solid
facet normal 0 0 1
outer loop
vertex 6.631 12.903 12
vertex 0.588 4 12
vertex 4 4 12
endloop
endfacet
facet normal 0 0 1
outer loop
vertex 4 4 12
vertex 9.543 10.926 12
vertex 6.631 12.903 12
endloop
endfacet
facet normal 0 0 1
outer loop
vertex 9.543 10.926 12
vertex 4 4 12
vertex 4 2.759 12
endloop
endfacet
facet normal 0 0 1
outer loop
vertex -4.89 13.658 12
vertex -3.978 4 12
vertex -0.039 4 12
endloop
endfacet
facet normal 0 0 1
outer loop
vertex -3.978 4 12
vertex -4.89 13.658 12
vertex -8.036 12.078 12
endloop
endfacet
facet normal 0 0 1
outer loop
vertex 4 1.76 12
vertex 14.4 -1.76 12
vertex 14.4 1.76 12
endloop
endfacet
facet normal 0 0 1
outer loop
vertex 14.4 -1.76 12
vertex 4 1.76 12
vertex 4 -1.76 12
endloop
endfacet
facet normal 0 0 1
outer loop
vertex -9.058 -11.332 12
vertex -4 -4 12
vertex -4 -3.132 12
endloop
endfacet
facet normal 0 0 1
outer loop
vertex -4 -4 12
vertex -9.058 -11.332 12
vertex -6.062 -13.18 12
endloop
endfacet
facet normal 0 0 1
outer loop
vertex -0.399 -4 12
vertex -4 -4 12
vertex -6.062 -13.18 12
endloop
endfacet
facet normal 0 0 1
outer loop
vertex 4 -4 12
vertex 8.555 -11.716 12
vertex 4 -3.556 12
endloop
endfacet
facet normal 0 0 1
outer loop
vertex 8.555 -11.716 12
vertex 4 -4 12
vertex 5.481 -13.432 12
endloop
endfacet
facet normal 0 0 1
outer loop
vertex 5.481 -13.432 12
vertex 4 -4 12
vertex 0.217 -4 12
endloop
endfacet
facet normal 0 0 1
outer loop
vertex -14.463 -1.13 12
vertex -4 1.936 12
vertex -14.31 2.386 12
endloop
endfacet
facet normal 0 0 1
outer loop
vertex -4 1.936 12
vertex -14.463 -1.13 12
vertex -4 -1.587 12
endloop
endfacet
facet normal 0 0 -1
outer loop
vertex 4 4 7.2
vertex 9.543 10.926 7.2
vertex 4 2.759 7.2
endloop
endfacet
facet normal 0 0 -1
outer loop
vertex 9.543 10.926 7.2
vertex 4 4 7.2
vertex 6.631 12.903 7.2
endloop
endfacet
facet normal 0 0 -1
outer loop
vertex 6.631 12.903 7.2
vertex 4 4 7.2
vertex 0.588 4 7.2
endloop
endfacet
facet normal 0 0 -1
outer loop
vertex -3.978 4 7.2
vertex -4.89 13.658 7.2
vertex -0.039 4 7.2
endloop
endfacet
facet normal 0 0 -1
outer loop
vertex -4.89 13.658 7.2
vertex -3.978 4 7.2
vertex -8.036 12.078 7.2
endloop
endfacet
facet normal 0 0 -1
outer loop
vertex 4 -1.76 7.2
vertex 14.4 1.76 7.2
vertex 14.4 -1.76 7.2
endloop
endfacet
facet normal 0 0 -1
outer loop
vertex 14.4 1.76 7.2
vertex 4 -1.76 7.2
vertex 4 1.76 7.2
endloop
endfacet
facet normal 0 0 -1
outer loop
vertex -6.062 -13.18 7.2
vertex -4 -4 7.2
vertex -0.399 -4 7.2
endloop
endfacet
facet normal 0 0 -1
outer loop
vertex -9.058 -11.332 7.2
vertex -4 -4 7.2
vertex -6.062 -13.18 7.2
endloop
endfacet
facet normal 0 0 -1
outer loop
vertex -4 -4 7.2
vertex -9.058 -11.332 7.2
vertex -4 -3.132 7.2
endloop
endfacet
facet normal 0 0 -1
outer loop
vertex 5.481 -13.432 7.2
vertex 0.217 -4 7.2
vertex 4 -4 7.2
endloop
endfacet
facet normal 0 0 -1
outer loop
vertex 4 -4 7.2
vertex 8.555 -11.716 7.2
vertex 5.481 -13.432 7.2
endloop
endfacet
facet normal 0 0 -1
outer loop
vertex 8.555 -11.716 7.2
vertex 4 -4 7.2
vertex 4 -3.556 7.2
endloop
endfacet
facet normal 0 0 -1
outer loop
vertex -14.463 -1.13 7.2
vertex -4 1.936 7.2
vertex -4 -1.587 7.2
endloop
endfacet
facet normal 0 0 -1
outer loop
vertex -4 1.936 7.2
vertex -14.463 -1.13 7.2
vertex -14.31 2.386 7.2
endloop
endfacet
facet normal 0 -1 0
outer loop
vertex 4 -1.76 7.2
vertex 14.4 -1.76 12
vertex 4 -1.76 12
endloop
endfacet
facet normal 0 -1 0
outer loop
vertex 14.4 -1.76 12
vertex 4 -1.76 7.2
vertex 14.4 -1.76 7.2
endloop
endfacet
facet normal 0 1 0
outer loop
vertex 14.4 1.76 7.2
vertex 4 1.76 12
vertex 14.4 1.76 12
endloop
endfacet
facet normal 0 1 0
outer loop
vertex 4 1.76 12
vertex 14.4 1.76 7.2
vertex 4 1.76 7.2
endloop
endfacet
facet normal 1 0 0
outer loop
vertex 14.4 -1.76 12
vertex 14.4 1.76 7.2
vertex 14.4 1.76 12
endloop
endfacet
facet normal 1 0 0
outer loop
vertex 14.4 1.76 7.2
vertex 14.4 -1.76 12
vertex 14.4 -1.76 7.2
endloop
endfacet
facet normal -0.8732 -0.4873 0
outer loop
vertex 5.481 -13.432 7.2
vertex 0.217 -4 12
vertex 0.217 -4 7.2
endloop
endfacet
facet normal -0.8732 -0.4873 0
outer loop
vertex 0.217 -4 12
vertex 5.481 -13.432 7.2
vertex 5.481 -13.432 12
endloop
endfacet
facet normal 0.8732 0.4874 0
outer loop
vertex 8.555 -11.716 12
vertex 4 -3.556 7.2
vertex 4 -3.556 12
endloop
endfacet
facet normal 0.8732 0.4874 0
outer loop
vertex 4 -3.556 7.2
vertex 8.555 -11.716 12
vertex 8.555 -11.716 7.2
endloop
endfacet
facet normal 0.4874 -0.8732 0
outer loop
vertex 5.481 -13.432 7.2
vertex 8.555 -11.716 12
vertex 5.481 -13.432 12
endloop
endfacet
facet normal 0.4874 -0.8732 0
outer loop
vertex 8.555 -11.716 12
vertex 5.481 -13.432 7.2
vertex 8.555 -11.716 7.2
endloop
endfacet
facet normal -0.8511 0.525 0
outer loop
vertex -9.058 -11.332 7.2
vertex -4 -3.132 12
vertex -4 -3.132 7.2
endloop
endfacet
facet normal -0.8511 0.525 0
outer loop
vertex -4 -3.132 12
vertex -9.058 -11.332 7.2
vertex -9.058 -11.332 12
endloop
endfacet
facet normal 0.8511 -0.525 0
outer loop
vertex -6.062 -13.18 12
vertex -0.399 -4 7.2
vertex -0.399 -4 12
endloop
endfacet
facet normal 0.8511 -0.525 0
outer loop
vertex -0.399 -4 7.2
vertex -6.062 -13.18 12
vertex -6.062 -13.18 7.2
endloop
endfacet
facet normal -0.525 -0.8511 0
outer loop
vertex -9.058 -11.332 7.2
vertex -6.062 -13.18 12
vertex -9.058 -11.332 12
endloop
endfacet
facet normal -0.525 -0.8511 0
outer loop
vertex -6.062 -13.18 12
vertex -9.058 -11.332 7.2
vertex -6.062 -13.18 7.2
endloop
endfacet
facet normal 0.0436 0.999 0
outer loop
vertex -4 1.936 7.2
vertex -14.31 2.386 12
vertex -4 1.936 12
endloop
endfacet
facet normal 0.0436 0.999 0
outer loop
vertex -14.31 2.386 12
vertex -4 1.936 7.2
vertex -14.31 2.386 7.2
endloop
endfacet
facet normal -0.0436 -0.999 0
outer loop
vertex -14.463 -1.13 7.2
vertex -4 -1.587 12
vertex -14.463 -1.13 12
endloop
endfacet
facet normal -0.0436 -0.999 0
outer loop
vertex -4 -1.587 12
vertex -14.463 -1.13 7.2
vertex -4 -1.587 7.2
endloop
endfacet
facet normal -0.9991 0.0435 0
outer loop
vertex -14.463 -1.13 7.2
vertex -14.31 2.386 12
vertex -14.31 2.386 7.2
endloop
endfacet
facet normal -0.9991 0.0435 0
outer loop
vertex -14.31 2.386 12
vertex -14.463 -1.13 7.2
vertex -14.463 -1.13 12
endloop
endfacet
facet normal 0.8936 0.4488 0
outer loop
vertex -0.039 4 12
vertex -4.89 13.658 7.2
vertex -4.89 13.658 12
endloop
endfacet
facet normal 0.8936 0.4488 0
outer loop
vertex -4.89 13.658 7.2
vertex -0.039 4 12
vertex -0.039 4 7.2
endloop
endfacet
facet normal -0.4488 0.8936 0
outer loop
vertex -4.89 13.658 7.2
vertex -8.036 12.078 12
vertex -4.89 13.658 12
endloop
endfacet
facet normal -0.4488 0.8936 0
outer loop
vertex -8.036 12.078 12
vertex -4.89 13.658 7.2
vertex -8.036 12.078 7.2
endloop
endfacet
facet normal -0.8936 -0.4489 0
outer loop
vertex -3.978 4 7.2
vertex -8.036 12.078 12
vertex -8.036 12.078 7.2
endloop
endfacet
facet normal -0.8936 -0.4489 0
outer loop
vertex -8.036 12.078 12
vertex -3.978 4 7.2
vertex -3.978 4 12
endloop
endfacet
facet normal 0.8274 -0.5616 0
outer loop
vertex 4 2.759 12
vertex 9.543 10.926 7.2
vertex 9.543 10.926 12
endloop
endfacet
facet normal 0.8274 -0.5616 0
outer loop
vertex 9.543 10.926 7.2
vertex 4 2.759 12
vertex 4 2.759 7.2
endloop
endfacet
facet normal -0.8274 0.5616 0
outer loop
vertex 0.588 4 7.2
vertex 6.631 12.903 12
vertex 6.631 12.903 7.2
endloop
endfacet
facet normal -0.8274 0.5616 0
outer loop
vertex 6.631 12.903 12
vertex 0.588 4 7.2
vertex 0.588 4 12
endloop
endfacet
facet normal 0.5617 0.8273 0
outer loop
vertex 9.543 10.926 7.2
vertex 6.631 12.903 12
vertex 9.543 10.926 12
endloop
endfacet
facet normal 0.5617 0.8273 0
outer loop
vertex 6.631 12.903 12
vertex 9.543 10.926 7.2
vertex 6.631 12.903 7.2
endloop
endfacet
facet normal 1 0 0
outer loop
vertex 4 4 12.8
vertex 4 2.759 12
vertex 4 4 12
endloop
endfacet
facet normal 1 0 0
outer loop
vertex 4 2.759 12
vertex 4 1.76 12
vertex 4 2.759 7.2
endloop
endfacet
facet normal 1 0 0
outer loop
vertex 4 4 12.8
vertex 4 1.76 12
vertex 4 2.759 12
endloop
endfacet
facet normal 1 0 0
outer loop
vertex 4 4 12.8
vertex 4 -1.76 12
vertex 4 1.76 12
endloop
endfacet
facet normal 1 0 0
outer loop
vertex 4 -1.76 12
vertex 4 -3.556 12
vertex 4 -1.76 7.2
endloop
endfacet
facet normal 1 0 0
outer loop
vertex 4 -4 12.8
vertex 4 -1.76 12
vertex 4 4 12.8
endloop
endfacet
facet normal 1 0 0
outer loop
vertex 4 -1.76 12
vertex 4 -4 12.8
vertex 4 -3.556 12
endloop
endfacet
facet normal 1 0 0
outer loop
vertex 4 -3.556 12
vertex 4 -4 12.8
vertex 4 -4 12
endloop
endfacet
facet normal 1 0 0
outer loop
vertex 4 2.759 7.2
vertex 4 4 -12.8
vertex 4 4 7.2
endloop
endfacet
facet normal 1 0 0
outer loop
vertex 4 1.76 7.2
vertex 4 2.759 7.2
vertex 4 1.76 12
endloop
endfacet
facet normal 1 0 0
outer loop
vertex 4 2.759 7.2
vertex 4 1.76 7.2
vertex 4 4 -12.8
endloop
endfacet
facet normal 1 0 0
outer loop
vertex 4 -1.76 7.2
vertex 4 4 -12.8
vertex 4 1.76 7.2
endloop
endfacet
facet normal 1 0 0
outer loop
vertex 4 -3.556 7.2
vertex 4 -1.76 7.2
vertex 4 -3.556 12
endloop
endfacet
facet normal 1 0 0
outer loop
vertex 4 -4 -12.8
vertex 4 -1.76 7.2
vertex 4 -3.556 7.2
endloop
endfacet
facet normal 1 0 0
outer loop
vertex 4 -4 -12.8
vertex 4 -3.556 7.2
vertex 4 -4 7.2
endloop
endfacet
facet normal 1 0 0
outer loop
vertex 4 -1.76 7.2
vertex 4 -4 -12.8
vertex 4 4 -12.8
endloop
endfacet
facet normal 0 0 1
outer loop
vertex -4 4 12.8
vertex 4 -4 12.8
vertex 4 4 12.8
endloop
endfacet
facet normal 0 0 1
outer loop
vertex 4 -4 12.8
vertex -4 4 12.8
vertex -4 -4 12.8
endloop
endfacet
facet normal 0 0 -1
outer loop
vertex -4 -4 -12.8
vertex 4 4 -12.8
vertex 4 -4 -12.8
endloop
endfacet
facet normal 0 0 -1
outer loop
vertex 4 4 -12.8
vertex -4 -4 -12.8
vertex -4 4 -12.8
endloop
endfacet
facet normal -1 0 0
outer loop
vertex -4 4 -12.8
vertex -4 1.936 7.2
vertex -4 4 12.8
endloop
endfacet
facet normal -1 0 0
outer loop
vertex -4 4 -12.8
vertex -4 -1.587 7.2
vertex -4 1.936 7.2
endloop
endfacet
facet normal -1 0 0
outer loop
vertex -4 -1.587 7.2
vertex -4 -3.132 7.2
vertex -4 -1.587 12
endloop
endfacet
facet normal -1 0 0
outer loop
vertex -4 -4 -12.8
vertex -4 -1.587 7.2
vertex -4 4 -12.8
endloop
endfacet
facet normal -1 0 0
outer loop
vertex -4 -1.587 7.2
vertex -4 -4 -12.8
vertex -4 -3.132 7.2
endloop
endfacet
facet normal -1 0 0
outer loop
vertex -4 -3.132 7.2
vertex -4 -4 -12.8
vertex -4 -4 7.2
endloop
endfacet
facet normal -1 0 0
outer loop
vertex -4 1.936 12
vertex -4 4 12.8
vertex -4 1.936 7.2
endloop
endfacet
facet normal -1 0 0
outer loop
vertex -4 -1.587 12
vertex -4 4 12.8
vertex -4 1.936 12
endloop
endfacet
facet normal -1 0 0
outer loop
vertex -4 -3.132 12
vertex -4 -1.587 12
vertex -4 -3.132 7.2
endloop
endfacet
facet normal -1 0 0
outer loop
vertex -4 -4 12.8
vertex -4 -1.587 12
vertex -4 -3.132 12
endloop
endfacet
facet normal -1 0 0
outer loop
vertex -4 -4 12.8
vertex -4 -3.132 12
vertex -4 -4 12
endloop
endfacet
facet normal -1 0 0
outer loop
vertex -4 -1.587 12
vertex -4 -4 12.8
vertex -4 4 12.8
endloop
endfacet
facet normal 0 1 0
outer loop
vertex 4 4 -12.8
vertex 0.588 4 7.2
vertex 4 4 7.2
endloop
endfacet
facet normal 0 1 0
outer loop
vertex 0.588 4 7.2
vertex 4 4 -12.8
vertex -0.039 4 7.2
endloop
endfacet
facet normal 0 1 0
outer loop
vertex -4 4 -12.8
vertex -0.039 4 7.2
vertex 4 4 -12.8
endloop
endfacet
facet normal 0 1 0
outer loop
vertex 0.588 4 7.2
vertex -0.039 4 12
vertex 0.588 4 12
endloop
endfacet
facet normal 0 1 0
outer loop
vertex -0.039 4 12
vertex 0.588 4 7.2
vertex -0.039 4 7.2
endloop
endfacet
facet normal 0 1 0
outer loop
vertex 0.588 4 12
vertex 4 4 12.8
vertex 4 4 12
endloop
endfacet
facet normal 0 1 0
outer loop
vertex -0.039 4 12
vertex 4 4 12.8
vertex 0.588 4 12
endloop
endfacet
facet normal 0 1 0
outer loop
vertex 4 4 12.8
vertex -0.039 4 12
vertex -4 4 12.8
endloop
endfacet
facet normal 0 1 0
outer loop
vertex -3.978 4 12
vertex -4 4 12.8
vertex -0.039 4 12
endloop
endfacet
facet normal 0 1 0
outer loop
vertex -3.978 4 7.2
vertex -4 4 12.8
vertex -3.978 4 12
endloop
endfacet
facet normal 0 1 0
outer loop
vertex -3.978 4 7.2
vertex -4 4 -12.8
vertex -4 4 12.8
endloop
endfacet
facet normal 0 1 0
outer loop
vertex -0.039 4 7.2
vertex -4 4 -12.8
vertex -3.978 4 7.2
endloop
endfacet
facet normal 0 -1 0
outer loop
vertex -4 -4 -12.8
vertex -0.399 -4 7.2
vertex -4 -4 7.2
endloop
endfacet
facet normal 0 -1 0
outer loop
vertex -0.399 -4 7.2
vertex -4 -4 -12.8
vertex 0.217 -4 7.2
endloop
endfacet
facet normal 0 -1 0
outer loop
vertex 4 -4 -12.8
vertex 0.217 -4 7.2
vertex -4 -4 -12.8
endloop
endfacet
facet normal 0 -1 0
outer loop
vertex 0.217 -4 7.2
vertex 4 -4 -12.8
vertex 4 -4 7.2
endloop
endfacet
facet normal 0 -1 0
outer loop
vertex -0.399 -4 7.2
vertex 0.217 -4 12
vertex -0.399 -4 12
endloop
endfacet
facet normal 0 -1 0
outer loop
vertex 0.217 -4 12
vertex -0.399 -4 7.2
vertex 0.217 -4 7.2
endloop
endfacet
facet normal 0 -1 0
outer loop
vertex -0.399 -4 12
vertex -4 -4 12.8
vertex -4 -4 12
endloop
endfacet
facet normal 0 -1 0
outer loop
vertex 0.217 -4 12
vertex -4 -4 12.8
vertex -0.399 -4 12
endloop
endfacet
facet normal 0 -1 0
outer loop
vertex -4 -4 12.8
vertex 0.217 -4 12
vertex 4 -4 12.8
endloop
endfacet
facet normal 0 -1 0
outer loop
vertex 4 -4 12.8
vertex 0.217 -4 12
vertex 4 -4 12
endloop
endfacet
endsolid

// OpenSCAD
size = 32;//block=32 //item=8


cube([size * 0.25, size * 0.25, size * 0.8], center = true);//shaft

translate([0, 0, size * 0.3]) {
  union() {
    count = 6;
    for(i = [0:1:count - 1]) {
      rotate([365 / count * i, 90, 0]) {
        translate([0, 0, size * 0.2]) {
          rotate([90, 0, 0]) {
            cube([size * 0.15, size * 0.5, size * 0.11], center = true);
          }
          ;//rotate
        }
        ;//translate
      }
      ;//rotate
    }
    ;//for
  }
  ;//union
}
;//translate
